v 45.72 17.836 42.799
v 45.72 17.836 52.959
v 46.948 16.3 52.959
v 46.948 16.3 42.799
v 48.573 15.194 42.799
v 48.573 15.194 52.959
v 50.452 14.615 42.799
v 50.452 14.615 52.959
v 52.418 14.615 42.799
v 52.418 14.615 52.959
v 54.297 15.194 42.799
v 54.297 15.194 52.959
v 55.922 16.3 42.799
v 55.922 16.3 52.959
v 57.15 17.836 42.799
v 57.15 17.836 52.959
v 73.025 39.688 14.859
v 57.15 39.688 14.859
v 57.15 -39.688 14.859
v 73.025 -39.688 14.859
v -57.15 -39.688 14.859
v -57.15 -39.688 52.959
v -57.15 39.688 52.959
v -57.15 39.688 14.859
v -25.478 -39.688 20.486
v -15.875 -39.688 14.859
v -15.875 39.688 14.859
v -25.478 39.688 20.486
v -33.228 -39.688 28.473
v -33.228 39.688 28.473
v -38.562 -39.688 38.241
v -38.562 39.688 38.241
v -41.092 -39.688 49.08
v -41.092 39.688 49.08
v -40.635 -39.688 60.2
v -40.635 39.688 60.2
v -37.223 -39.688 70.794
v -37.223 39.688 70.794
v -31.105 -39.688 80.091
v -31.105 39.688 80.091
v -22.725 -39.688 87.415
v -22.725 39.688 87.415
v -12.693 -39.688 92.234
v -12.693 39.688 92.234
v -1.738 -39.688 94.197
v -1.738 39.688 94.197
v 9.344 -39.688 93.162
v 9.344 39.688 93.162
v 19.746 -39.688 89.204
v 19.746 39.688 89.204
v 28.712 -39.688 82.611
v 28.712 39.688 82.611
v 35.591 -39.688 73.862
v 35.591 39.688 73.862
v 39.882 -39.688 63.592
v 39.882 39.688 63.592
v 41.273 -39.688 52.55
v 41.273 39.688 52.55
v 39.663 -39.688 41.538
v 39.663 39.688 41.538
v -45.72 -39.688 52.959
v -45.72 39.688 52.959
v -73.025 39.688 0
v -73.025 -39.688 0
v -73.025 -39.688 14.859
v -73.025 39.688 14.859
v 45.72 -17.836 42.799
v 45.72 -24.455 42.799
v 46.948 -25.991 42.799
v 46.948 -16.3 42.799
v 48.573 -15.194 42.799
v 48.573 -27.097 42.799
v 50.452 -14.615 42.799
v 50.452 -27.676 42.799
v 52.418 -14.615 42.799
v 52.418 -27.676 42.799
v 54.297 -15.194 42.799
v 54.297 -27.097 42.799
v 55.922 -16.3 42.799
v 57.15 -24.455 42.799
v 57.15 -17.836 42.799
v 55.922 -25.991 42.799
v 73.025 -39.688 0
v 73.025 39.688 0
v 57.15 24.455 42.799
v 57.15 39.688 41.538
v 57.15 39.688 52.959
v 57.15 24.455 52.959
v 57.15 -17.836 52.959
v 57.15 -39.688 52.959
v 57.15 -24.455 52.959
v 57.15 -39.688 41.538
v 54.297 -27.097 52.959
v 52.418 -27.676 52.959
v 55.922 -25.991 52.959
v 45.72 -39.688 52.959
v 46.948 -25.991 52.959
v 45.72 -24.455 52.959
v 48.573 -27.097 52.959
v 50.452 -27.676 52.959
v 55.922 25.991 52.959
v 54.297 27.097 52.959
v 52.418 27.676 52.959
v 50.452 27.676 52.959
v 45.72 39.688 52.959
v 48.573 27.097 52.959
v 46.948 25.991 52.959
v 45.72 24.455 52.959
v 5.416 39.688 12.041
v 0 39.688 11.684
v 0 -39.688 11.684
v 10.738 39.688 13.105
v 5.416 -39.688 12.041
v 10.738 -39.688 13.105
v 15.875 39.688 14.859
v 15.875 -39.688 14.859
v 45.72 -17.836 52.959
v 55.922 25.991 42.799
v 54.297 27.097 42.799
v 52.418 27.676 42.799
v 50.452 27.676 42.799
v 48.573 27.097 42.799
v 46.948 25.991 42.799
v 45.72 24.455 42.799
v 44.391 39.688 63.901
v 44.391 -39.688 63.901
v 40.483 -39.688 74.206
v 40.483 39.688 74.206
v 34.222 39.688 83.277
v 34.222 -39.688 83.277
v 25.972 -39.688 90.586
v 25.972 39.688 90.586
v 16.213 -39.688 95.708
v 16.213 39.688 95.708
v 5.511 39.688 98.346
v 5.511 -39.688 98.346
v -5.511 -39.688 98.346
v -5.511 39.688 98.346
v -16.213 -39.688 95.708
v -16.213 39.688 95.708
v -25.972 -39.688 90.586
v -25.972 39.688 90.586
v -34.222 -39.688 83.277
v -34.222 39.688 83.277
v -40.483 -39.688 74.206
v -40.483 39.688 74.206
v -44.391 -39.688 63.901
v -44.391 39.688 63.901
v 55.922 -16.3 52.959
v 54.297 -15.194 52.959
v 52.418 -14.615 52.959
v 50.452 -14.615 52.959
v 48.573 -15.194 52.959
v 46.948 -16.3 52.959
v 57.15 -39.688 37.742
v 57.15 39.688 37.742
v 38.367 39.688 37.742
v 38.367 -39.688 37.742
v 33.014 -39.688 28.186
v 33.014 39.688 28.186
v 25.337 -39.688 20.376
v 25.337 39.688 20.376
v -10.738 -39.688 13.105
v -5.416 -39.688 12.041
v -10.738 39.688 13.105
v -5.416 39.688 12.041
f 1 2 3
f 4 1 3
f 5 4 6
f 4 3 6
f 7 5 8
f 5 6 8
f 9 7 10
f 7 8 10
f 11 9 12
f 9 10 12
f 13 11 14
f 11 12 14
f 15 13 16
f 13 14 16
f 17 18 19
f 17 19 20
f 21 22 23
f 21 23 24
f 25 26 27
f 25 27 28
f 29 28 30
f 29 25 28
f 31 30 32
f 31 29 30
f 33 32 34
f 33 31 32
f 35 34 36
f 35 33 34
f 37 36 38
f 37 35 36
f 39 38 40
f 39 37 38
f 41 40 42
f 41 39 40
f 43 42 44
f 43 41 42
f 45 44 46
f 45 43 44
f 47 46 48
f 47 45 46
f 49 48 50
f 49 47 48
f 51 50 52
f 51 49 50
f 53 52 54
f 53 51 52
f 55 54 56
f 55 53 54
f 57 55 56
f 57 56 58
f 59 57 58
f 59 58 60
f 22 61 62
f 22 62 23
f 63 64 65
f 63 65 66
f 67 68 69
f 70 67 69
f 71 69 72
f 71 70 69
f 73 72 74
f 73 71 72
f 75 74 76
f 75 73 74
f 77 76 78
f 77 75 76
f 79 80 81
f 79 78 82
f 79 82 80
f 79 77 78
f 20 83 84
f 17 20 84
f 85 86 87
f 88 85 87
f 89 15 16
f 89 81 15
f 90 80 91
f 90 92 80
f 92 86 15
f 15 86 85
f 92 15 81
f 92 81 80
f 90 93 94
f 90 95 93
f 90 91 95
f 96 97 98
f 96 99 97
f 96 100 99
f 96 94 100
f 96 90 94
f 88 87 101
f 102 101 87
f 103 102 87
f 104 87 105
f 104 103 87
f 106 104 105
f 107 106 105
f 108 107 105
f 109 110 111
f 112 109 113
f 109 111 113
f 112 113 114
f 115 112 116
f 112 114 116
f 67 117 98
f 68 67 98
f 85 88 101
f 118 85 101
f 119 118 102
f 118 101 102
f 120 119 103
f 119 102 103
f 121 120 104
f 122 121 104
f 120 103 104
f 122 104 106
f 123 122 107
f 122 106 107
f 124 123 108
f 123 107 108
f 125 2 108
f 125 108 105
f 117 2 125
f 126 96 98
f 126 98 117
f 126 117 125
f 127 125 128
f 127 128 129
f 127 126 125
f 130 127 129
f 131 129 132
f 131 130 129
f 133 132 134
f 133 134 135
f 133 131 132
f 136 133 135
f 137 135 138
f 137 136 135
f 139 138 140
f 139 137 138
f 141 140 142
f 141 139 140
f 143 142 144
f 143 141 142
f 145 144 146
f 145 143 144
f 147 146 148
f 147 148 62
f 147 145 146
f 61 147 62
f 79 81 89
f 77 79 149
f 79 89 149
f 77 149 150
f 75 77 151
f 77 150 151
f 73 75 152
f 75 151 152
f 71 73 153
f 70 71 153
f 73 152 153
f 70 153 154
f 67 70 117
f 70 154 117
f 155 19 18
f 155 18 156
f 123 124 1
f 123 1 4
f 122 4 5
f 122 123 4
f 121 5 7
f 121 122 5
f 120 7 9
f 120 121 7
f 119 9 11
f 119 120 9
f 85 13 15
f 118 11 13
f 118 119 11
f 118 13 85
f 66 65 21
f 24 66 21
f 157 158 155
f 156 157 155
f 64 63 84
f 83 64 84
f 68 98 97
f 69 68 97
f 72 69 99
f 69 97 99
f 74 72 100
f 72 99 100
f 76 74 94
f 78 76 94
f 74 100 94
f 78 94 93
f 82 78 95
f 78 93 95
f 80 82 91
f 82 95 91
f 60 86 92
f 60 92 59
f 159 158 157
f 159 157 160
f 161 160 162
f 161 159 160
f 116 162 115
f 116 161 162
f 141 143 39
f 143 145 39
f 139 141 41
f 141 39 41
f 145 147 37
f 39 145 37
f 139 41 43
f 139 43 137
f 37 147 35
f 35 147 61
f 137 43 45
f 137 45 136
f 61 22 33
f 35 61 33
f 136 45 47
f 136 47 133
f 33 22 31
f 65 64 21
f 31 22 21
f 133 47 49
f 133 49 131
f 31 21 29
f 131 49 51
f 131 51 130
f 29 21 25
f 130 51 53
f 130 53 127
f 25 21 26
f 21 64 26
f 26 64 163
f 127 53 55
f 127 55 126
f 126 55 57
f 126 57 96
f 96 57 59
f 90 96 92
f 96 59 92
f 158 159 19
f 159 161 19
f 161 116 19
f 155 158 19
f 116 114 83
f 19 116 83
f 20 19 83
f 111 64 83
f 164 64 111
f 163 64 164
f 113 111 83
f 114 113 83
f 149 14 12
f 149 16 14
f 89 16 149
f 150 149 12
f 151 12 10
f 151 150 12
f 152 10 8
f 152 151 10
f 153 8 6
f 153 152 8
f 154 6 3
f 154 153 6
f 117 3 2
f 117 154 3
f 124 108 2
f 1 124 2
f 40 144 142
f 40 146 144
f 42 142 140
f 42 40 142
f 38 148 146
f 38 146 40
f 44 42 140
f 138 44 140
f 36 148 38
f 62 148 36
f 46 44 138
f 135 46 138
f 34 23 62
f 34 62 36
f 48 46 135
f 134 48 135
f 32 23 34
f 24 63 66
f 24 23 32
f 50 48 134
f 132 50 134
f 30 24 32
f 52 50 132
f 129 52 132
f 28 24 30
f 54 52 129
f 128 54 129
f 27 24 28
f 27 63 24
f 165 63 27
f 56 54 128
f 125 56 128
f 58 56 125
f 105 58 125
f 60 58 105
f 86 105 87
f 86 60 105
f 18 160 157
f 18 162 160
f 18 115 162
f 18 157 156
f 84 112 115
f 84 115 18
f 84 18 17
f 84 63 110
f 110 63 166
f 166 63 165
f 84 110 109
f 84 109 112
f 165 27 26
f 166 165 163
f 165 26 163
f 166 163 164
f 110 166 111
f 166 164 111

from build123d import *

# Parameters (mm, degrees)
F0_W     = 146.05
F0_H     = 79.375
F1_DEPTH = 14.859
F3_DEPTH = 79.375
F4_DEPTH = 85.725
F6_DEPTH = 79.376
F8_DEPTH = 10.16


with BuildPart() as f1:
    # F0 (on Top) → F1 (new body)
    with BuildSketch(Plane.XY):
        Rectangle(F0_W, F0_H)
    extrude(amount=F1_DEPTH)

    # F2 (on face) → F3 (join)
    with BuildSketch(Plane.XZ.offset(39.6875)):
        with BuildLine():
            Line((-57.15, 14.859), (-15.875, 14.859))
            ThreePointArc((-15.875, 14.859), (-22.8952505992, 87.3018758988), (41.275, 52.959))
            ThreePointArc((41.275, 52.959), (34.3428758988, 30.0637494008), (15.875, 14.859))
            Line((15.875, 14.859), (57.15, 14.859))
            Line((57.15, 14.859), (57.15, 52.959))
            Line((57.15, 52.959), (45.72, 52.959))
            ThreePointArc((45.72, 52.959), (0, 98.679), (-45.72, 52.959))
            Line((-45.72, 52.959), (-57.15, 52.959))
            Line((-57.15, 52.959), (-57.15, 14.859))
        make_face()
    extrude(amount=-F3_DEPTH)

    # F2 (on face) → F4 (cut)
    with BuildSketch(Plane.XZ.offset(39.6875)):
        with BuildLine():
            Line((0, 14.859), (0, 11.684))
            ThreePointArc((0, 11.684), (8.0946934778, 12.4855326109), (15.875, 14.859))
            Line((15.875, 14.859), (0, 14.859))
        make_face()
        with BuildLine():
            ThreePointArc((-15.875, 14.859), (-8.0946934778, 12.4855326109), (0, 11.684))
            Line((0, 11.684), (0, 14.859))
            Line((0, 14.859), (-15.875, 14.859))
        make_face()
    extrude(amount=-F4_DEPTH, mode=Mode.SUBTRACT)

    # F5 (on face) → F6 (cut, through all)
    with BuildSketch(Plane.XZ.offset(39.6875)):
        with BuildLine():
            Line((57.15, 37.7415791154), (57.15, 41.5375120938))
            Line((57.15, 41.5375120938), (39.6632731757, 41.5375120938))
            ThreePointArc((39.6632731757, 41.5375120938), (39.0614634109, 39.6237946698), (38.3673784174, 37.7415791154))
            Line((38.3673784174, 37.7415791154), (57.15, 37.7415791154))
        make_face()
    extrude(amount=-F6_DEPTH, mode=Mode.SUBTRACT)

    # F7 (on face) → F8 (cut)
    with BuildSketch(Plane.XY.offset(52.959)):
        with BuildLine():
            Line((57.15, 17.8361811879), (57.15, 24.4548188121))
            ThreePointArc((57.15, 24.4548188121), (51.435, 27.7495), (45.72, 24.4548188121))
            Line((45.72, 24.4548188121), (45.72, 17.8361811879))
            ThreePointArc((45.72, 17.8361811879), (51.435, 14.5415), (57.15, 17.8361811879))
        make_face()
        with BuildLine():
            Line((57.15, -24.4548188121), (57.15, -17.8361811879))
            ThreePointArc((57.15, -17.8361811879), (51.435, -14.5415), (45.72, -17.8361811879))
            Line((45.72, -17.8361811879), (45.72, -24.4548188121))
            ThreePointArc((45.72, -24.4548188121), (51.435, -27.7495), (57.15, -24.4548188121))
        make_face()
    extrude(amount=-F8_DEPTH, mode=Mode.SUBTRACT)


solid = f1.part
